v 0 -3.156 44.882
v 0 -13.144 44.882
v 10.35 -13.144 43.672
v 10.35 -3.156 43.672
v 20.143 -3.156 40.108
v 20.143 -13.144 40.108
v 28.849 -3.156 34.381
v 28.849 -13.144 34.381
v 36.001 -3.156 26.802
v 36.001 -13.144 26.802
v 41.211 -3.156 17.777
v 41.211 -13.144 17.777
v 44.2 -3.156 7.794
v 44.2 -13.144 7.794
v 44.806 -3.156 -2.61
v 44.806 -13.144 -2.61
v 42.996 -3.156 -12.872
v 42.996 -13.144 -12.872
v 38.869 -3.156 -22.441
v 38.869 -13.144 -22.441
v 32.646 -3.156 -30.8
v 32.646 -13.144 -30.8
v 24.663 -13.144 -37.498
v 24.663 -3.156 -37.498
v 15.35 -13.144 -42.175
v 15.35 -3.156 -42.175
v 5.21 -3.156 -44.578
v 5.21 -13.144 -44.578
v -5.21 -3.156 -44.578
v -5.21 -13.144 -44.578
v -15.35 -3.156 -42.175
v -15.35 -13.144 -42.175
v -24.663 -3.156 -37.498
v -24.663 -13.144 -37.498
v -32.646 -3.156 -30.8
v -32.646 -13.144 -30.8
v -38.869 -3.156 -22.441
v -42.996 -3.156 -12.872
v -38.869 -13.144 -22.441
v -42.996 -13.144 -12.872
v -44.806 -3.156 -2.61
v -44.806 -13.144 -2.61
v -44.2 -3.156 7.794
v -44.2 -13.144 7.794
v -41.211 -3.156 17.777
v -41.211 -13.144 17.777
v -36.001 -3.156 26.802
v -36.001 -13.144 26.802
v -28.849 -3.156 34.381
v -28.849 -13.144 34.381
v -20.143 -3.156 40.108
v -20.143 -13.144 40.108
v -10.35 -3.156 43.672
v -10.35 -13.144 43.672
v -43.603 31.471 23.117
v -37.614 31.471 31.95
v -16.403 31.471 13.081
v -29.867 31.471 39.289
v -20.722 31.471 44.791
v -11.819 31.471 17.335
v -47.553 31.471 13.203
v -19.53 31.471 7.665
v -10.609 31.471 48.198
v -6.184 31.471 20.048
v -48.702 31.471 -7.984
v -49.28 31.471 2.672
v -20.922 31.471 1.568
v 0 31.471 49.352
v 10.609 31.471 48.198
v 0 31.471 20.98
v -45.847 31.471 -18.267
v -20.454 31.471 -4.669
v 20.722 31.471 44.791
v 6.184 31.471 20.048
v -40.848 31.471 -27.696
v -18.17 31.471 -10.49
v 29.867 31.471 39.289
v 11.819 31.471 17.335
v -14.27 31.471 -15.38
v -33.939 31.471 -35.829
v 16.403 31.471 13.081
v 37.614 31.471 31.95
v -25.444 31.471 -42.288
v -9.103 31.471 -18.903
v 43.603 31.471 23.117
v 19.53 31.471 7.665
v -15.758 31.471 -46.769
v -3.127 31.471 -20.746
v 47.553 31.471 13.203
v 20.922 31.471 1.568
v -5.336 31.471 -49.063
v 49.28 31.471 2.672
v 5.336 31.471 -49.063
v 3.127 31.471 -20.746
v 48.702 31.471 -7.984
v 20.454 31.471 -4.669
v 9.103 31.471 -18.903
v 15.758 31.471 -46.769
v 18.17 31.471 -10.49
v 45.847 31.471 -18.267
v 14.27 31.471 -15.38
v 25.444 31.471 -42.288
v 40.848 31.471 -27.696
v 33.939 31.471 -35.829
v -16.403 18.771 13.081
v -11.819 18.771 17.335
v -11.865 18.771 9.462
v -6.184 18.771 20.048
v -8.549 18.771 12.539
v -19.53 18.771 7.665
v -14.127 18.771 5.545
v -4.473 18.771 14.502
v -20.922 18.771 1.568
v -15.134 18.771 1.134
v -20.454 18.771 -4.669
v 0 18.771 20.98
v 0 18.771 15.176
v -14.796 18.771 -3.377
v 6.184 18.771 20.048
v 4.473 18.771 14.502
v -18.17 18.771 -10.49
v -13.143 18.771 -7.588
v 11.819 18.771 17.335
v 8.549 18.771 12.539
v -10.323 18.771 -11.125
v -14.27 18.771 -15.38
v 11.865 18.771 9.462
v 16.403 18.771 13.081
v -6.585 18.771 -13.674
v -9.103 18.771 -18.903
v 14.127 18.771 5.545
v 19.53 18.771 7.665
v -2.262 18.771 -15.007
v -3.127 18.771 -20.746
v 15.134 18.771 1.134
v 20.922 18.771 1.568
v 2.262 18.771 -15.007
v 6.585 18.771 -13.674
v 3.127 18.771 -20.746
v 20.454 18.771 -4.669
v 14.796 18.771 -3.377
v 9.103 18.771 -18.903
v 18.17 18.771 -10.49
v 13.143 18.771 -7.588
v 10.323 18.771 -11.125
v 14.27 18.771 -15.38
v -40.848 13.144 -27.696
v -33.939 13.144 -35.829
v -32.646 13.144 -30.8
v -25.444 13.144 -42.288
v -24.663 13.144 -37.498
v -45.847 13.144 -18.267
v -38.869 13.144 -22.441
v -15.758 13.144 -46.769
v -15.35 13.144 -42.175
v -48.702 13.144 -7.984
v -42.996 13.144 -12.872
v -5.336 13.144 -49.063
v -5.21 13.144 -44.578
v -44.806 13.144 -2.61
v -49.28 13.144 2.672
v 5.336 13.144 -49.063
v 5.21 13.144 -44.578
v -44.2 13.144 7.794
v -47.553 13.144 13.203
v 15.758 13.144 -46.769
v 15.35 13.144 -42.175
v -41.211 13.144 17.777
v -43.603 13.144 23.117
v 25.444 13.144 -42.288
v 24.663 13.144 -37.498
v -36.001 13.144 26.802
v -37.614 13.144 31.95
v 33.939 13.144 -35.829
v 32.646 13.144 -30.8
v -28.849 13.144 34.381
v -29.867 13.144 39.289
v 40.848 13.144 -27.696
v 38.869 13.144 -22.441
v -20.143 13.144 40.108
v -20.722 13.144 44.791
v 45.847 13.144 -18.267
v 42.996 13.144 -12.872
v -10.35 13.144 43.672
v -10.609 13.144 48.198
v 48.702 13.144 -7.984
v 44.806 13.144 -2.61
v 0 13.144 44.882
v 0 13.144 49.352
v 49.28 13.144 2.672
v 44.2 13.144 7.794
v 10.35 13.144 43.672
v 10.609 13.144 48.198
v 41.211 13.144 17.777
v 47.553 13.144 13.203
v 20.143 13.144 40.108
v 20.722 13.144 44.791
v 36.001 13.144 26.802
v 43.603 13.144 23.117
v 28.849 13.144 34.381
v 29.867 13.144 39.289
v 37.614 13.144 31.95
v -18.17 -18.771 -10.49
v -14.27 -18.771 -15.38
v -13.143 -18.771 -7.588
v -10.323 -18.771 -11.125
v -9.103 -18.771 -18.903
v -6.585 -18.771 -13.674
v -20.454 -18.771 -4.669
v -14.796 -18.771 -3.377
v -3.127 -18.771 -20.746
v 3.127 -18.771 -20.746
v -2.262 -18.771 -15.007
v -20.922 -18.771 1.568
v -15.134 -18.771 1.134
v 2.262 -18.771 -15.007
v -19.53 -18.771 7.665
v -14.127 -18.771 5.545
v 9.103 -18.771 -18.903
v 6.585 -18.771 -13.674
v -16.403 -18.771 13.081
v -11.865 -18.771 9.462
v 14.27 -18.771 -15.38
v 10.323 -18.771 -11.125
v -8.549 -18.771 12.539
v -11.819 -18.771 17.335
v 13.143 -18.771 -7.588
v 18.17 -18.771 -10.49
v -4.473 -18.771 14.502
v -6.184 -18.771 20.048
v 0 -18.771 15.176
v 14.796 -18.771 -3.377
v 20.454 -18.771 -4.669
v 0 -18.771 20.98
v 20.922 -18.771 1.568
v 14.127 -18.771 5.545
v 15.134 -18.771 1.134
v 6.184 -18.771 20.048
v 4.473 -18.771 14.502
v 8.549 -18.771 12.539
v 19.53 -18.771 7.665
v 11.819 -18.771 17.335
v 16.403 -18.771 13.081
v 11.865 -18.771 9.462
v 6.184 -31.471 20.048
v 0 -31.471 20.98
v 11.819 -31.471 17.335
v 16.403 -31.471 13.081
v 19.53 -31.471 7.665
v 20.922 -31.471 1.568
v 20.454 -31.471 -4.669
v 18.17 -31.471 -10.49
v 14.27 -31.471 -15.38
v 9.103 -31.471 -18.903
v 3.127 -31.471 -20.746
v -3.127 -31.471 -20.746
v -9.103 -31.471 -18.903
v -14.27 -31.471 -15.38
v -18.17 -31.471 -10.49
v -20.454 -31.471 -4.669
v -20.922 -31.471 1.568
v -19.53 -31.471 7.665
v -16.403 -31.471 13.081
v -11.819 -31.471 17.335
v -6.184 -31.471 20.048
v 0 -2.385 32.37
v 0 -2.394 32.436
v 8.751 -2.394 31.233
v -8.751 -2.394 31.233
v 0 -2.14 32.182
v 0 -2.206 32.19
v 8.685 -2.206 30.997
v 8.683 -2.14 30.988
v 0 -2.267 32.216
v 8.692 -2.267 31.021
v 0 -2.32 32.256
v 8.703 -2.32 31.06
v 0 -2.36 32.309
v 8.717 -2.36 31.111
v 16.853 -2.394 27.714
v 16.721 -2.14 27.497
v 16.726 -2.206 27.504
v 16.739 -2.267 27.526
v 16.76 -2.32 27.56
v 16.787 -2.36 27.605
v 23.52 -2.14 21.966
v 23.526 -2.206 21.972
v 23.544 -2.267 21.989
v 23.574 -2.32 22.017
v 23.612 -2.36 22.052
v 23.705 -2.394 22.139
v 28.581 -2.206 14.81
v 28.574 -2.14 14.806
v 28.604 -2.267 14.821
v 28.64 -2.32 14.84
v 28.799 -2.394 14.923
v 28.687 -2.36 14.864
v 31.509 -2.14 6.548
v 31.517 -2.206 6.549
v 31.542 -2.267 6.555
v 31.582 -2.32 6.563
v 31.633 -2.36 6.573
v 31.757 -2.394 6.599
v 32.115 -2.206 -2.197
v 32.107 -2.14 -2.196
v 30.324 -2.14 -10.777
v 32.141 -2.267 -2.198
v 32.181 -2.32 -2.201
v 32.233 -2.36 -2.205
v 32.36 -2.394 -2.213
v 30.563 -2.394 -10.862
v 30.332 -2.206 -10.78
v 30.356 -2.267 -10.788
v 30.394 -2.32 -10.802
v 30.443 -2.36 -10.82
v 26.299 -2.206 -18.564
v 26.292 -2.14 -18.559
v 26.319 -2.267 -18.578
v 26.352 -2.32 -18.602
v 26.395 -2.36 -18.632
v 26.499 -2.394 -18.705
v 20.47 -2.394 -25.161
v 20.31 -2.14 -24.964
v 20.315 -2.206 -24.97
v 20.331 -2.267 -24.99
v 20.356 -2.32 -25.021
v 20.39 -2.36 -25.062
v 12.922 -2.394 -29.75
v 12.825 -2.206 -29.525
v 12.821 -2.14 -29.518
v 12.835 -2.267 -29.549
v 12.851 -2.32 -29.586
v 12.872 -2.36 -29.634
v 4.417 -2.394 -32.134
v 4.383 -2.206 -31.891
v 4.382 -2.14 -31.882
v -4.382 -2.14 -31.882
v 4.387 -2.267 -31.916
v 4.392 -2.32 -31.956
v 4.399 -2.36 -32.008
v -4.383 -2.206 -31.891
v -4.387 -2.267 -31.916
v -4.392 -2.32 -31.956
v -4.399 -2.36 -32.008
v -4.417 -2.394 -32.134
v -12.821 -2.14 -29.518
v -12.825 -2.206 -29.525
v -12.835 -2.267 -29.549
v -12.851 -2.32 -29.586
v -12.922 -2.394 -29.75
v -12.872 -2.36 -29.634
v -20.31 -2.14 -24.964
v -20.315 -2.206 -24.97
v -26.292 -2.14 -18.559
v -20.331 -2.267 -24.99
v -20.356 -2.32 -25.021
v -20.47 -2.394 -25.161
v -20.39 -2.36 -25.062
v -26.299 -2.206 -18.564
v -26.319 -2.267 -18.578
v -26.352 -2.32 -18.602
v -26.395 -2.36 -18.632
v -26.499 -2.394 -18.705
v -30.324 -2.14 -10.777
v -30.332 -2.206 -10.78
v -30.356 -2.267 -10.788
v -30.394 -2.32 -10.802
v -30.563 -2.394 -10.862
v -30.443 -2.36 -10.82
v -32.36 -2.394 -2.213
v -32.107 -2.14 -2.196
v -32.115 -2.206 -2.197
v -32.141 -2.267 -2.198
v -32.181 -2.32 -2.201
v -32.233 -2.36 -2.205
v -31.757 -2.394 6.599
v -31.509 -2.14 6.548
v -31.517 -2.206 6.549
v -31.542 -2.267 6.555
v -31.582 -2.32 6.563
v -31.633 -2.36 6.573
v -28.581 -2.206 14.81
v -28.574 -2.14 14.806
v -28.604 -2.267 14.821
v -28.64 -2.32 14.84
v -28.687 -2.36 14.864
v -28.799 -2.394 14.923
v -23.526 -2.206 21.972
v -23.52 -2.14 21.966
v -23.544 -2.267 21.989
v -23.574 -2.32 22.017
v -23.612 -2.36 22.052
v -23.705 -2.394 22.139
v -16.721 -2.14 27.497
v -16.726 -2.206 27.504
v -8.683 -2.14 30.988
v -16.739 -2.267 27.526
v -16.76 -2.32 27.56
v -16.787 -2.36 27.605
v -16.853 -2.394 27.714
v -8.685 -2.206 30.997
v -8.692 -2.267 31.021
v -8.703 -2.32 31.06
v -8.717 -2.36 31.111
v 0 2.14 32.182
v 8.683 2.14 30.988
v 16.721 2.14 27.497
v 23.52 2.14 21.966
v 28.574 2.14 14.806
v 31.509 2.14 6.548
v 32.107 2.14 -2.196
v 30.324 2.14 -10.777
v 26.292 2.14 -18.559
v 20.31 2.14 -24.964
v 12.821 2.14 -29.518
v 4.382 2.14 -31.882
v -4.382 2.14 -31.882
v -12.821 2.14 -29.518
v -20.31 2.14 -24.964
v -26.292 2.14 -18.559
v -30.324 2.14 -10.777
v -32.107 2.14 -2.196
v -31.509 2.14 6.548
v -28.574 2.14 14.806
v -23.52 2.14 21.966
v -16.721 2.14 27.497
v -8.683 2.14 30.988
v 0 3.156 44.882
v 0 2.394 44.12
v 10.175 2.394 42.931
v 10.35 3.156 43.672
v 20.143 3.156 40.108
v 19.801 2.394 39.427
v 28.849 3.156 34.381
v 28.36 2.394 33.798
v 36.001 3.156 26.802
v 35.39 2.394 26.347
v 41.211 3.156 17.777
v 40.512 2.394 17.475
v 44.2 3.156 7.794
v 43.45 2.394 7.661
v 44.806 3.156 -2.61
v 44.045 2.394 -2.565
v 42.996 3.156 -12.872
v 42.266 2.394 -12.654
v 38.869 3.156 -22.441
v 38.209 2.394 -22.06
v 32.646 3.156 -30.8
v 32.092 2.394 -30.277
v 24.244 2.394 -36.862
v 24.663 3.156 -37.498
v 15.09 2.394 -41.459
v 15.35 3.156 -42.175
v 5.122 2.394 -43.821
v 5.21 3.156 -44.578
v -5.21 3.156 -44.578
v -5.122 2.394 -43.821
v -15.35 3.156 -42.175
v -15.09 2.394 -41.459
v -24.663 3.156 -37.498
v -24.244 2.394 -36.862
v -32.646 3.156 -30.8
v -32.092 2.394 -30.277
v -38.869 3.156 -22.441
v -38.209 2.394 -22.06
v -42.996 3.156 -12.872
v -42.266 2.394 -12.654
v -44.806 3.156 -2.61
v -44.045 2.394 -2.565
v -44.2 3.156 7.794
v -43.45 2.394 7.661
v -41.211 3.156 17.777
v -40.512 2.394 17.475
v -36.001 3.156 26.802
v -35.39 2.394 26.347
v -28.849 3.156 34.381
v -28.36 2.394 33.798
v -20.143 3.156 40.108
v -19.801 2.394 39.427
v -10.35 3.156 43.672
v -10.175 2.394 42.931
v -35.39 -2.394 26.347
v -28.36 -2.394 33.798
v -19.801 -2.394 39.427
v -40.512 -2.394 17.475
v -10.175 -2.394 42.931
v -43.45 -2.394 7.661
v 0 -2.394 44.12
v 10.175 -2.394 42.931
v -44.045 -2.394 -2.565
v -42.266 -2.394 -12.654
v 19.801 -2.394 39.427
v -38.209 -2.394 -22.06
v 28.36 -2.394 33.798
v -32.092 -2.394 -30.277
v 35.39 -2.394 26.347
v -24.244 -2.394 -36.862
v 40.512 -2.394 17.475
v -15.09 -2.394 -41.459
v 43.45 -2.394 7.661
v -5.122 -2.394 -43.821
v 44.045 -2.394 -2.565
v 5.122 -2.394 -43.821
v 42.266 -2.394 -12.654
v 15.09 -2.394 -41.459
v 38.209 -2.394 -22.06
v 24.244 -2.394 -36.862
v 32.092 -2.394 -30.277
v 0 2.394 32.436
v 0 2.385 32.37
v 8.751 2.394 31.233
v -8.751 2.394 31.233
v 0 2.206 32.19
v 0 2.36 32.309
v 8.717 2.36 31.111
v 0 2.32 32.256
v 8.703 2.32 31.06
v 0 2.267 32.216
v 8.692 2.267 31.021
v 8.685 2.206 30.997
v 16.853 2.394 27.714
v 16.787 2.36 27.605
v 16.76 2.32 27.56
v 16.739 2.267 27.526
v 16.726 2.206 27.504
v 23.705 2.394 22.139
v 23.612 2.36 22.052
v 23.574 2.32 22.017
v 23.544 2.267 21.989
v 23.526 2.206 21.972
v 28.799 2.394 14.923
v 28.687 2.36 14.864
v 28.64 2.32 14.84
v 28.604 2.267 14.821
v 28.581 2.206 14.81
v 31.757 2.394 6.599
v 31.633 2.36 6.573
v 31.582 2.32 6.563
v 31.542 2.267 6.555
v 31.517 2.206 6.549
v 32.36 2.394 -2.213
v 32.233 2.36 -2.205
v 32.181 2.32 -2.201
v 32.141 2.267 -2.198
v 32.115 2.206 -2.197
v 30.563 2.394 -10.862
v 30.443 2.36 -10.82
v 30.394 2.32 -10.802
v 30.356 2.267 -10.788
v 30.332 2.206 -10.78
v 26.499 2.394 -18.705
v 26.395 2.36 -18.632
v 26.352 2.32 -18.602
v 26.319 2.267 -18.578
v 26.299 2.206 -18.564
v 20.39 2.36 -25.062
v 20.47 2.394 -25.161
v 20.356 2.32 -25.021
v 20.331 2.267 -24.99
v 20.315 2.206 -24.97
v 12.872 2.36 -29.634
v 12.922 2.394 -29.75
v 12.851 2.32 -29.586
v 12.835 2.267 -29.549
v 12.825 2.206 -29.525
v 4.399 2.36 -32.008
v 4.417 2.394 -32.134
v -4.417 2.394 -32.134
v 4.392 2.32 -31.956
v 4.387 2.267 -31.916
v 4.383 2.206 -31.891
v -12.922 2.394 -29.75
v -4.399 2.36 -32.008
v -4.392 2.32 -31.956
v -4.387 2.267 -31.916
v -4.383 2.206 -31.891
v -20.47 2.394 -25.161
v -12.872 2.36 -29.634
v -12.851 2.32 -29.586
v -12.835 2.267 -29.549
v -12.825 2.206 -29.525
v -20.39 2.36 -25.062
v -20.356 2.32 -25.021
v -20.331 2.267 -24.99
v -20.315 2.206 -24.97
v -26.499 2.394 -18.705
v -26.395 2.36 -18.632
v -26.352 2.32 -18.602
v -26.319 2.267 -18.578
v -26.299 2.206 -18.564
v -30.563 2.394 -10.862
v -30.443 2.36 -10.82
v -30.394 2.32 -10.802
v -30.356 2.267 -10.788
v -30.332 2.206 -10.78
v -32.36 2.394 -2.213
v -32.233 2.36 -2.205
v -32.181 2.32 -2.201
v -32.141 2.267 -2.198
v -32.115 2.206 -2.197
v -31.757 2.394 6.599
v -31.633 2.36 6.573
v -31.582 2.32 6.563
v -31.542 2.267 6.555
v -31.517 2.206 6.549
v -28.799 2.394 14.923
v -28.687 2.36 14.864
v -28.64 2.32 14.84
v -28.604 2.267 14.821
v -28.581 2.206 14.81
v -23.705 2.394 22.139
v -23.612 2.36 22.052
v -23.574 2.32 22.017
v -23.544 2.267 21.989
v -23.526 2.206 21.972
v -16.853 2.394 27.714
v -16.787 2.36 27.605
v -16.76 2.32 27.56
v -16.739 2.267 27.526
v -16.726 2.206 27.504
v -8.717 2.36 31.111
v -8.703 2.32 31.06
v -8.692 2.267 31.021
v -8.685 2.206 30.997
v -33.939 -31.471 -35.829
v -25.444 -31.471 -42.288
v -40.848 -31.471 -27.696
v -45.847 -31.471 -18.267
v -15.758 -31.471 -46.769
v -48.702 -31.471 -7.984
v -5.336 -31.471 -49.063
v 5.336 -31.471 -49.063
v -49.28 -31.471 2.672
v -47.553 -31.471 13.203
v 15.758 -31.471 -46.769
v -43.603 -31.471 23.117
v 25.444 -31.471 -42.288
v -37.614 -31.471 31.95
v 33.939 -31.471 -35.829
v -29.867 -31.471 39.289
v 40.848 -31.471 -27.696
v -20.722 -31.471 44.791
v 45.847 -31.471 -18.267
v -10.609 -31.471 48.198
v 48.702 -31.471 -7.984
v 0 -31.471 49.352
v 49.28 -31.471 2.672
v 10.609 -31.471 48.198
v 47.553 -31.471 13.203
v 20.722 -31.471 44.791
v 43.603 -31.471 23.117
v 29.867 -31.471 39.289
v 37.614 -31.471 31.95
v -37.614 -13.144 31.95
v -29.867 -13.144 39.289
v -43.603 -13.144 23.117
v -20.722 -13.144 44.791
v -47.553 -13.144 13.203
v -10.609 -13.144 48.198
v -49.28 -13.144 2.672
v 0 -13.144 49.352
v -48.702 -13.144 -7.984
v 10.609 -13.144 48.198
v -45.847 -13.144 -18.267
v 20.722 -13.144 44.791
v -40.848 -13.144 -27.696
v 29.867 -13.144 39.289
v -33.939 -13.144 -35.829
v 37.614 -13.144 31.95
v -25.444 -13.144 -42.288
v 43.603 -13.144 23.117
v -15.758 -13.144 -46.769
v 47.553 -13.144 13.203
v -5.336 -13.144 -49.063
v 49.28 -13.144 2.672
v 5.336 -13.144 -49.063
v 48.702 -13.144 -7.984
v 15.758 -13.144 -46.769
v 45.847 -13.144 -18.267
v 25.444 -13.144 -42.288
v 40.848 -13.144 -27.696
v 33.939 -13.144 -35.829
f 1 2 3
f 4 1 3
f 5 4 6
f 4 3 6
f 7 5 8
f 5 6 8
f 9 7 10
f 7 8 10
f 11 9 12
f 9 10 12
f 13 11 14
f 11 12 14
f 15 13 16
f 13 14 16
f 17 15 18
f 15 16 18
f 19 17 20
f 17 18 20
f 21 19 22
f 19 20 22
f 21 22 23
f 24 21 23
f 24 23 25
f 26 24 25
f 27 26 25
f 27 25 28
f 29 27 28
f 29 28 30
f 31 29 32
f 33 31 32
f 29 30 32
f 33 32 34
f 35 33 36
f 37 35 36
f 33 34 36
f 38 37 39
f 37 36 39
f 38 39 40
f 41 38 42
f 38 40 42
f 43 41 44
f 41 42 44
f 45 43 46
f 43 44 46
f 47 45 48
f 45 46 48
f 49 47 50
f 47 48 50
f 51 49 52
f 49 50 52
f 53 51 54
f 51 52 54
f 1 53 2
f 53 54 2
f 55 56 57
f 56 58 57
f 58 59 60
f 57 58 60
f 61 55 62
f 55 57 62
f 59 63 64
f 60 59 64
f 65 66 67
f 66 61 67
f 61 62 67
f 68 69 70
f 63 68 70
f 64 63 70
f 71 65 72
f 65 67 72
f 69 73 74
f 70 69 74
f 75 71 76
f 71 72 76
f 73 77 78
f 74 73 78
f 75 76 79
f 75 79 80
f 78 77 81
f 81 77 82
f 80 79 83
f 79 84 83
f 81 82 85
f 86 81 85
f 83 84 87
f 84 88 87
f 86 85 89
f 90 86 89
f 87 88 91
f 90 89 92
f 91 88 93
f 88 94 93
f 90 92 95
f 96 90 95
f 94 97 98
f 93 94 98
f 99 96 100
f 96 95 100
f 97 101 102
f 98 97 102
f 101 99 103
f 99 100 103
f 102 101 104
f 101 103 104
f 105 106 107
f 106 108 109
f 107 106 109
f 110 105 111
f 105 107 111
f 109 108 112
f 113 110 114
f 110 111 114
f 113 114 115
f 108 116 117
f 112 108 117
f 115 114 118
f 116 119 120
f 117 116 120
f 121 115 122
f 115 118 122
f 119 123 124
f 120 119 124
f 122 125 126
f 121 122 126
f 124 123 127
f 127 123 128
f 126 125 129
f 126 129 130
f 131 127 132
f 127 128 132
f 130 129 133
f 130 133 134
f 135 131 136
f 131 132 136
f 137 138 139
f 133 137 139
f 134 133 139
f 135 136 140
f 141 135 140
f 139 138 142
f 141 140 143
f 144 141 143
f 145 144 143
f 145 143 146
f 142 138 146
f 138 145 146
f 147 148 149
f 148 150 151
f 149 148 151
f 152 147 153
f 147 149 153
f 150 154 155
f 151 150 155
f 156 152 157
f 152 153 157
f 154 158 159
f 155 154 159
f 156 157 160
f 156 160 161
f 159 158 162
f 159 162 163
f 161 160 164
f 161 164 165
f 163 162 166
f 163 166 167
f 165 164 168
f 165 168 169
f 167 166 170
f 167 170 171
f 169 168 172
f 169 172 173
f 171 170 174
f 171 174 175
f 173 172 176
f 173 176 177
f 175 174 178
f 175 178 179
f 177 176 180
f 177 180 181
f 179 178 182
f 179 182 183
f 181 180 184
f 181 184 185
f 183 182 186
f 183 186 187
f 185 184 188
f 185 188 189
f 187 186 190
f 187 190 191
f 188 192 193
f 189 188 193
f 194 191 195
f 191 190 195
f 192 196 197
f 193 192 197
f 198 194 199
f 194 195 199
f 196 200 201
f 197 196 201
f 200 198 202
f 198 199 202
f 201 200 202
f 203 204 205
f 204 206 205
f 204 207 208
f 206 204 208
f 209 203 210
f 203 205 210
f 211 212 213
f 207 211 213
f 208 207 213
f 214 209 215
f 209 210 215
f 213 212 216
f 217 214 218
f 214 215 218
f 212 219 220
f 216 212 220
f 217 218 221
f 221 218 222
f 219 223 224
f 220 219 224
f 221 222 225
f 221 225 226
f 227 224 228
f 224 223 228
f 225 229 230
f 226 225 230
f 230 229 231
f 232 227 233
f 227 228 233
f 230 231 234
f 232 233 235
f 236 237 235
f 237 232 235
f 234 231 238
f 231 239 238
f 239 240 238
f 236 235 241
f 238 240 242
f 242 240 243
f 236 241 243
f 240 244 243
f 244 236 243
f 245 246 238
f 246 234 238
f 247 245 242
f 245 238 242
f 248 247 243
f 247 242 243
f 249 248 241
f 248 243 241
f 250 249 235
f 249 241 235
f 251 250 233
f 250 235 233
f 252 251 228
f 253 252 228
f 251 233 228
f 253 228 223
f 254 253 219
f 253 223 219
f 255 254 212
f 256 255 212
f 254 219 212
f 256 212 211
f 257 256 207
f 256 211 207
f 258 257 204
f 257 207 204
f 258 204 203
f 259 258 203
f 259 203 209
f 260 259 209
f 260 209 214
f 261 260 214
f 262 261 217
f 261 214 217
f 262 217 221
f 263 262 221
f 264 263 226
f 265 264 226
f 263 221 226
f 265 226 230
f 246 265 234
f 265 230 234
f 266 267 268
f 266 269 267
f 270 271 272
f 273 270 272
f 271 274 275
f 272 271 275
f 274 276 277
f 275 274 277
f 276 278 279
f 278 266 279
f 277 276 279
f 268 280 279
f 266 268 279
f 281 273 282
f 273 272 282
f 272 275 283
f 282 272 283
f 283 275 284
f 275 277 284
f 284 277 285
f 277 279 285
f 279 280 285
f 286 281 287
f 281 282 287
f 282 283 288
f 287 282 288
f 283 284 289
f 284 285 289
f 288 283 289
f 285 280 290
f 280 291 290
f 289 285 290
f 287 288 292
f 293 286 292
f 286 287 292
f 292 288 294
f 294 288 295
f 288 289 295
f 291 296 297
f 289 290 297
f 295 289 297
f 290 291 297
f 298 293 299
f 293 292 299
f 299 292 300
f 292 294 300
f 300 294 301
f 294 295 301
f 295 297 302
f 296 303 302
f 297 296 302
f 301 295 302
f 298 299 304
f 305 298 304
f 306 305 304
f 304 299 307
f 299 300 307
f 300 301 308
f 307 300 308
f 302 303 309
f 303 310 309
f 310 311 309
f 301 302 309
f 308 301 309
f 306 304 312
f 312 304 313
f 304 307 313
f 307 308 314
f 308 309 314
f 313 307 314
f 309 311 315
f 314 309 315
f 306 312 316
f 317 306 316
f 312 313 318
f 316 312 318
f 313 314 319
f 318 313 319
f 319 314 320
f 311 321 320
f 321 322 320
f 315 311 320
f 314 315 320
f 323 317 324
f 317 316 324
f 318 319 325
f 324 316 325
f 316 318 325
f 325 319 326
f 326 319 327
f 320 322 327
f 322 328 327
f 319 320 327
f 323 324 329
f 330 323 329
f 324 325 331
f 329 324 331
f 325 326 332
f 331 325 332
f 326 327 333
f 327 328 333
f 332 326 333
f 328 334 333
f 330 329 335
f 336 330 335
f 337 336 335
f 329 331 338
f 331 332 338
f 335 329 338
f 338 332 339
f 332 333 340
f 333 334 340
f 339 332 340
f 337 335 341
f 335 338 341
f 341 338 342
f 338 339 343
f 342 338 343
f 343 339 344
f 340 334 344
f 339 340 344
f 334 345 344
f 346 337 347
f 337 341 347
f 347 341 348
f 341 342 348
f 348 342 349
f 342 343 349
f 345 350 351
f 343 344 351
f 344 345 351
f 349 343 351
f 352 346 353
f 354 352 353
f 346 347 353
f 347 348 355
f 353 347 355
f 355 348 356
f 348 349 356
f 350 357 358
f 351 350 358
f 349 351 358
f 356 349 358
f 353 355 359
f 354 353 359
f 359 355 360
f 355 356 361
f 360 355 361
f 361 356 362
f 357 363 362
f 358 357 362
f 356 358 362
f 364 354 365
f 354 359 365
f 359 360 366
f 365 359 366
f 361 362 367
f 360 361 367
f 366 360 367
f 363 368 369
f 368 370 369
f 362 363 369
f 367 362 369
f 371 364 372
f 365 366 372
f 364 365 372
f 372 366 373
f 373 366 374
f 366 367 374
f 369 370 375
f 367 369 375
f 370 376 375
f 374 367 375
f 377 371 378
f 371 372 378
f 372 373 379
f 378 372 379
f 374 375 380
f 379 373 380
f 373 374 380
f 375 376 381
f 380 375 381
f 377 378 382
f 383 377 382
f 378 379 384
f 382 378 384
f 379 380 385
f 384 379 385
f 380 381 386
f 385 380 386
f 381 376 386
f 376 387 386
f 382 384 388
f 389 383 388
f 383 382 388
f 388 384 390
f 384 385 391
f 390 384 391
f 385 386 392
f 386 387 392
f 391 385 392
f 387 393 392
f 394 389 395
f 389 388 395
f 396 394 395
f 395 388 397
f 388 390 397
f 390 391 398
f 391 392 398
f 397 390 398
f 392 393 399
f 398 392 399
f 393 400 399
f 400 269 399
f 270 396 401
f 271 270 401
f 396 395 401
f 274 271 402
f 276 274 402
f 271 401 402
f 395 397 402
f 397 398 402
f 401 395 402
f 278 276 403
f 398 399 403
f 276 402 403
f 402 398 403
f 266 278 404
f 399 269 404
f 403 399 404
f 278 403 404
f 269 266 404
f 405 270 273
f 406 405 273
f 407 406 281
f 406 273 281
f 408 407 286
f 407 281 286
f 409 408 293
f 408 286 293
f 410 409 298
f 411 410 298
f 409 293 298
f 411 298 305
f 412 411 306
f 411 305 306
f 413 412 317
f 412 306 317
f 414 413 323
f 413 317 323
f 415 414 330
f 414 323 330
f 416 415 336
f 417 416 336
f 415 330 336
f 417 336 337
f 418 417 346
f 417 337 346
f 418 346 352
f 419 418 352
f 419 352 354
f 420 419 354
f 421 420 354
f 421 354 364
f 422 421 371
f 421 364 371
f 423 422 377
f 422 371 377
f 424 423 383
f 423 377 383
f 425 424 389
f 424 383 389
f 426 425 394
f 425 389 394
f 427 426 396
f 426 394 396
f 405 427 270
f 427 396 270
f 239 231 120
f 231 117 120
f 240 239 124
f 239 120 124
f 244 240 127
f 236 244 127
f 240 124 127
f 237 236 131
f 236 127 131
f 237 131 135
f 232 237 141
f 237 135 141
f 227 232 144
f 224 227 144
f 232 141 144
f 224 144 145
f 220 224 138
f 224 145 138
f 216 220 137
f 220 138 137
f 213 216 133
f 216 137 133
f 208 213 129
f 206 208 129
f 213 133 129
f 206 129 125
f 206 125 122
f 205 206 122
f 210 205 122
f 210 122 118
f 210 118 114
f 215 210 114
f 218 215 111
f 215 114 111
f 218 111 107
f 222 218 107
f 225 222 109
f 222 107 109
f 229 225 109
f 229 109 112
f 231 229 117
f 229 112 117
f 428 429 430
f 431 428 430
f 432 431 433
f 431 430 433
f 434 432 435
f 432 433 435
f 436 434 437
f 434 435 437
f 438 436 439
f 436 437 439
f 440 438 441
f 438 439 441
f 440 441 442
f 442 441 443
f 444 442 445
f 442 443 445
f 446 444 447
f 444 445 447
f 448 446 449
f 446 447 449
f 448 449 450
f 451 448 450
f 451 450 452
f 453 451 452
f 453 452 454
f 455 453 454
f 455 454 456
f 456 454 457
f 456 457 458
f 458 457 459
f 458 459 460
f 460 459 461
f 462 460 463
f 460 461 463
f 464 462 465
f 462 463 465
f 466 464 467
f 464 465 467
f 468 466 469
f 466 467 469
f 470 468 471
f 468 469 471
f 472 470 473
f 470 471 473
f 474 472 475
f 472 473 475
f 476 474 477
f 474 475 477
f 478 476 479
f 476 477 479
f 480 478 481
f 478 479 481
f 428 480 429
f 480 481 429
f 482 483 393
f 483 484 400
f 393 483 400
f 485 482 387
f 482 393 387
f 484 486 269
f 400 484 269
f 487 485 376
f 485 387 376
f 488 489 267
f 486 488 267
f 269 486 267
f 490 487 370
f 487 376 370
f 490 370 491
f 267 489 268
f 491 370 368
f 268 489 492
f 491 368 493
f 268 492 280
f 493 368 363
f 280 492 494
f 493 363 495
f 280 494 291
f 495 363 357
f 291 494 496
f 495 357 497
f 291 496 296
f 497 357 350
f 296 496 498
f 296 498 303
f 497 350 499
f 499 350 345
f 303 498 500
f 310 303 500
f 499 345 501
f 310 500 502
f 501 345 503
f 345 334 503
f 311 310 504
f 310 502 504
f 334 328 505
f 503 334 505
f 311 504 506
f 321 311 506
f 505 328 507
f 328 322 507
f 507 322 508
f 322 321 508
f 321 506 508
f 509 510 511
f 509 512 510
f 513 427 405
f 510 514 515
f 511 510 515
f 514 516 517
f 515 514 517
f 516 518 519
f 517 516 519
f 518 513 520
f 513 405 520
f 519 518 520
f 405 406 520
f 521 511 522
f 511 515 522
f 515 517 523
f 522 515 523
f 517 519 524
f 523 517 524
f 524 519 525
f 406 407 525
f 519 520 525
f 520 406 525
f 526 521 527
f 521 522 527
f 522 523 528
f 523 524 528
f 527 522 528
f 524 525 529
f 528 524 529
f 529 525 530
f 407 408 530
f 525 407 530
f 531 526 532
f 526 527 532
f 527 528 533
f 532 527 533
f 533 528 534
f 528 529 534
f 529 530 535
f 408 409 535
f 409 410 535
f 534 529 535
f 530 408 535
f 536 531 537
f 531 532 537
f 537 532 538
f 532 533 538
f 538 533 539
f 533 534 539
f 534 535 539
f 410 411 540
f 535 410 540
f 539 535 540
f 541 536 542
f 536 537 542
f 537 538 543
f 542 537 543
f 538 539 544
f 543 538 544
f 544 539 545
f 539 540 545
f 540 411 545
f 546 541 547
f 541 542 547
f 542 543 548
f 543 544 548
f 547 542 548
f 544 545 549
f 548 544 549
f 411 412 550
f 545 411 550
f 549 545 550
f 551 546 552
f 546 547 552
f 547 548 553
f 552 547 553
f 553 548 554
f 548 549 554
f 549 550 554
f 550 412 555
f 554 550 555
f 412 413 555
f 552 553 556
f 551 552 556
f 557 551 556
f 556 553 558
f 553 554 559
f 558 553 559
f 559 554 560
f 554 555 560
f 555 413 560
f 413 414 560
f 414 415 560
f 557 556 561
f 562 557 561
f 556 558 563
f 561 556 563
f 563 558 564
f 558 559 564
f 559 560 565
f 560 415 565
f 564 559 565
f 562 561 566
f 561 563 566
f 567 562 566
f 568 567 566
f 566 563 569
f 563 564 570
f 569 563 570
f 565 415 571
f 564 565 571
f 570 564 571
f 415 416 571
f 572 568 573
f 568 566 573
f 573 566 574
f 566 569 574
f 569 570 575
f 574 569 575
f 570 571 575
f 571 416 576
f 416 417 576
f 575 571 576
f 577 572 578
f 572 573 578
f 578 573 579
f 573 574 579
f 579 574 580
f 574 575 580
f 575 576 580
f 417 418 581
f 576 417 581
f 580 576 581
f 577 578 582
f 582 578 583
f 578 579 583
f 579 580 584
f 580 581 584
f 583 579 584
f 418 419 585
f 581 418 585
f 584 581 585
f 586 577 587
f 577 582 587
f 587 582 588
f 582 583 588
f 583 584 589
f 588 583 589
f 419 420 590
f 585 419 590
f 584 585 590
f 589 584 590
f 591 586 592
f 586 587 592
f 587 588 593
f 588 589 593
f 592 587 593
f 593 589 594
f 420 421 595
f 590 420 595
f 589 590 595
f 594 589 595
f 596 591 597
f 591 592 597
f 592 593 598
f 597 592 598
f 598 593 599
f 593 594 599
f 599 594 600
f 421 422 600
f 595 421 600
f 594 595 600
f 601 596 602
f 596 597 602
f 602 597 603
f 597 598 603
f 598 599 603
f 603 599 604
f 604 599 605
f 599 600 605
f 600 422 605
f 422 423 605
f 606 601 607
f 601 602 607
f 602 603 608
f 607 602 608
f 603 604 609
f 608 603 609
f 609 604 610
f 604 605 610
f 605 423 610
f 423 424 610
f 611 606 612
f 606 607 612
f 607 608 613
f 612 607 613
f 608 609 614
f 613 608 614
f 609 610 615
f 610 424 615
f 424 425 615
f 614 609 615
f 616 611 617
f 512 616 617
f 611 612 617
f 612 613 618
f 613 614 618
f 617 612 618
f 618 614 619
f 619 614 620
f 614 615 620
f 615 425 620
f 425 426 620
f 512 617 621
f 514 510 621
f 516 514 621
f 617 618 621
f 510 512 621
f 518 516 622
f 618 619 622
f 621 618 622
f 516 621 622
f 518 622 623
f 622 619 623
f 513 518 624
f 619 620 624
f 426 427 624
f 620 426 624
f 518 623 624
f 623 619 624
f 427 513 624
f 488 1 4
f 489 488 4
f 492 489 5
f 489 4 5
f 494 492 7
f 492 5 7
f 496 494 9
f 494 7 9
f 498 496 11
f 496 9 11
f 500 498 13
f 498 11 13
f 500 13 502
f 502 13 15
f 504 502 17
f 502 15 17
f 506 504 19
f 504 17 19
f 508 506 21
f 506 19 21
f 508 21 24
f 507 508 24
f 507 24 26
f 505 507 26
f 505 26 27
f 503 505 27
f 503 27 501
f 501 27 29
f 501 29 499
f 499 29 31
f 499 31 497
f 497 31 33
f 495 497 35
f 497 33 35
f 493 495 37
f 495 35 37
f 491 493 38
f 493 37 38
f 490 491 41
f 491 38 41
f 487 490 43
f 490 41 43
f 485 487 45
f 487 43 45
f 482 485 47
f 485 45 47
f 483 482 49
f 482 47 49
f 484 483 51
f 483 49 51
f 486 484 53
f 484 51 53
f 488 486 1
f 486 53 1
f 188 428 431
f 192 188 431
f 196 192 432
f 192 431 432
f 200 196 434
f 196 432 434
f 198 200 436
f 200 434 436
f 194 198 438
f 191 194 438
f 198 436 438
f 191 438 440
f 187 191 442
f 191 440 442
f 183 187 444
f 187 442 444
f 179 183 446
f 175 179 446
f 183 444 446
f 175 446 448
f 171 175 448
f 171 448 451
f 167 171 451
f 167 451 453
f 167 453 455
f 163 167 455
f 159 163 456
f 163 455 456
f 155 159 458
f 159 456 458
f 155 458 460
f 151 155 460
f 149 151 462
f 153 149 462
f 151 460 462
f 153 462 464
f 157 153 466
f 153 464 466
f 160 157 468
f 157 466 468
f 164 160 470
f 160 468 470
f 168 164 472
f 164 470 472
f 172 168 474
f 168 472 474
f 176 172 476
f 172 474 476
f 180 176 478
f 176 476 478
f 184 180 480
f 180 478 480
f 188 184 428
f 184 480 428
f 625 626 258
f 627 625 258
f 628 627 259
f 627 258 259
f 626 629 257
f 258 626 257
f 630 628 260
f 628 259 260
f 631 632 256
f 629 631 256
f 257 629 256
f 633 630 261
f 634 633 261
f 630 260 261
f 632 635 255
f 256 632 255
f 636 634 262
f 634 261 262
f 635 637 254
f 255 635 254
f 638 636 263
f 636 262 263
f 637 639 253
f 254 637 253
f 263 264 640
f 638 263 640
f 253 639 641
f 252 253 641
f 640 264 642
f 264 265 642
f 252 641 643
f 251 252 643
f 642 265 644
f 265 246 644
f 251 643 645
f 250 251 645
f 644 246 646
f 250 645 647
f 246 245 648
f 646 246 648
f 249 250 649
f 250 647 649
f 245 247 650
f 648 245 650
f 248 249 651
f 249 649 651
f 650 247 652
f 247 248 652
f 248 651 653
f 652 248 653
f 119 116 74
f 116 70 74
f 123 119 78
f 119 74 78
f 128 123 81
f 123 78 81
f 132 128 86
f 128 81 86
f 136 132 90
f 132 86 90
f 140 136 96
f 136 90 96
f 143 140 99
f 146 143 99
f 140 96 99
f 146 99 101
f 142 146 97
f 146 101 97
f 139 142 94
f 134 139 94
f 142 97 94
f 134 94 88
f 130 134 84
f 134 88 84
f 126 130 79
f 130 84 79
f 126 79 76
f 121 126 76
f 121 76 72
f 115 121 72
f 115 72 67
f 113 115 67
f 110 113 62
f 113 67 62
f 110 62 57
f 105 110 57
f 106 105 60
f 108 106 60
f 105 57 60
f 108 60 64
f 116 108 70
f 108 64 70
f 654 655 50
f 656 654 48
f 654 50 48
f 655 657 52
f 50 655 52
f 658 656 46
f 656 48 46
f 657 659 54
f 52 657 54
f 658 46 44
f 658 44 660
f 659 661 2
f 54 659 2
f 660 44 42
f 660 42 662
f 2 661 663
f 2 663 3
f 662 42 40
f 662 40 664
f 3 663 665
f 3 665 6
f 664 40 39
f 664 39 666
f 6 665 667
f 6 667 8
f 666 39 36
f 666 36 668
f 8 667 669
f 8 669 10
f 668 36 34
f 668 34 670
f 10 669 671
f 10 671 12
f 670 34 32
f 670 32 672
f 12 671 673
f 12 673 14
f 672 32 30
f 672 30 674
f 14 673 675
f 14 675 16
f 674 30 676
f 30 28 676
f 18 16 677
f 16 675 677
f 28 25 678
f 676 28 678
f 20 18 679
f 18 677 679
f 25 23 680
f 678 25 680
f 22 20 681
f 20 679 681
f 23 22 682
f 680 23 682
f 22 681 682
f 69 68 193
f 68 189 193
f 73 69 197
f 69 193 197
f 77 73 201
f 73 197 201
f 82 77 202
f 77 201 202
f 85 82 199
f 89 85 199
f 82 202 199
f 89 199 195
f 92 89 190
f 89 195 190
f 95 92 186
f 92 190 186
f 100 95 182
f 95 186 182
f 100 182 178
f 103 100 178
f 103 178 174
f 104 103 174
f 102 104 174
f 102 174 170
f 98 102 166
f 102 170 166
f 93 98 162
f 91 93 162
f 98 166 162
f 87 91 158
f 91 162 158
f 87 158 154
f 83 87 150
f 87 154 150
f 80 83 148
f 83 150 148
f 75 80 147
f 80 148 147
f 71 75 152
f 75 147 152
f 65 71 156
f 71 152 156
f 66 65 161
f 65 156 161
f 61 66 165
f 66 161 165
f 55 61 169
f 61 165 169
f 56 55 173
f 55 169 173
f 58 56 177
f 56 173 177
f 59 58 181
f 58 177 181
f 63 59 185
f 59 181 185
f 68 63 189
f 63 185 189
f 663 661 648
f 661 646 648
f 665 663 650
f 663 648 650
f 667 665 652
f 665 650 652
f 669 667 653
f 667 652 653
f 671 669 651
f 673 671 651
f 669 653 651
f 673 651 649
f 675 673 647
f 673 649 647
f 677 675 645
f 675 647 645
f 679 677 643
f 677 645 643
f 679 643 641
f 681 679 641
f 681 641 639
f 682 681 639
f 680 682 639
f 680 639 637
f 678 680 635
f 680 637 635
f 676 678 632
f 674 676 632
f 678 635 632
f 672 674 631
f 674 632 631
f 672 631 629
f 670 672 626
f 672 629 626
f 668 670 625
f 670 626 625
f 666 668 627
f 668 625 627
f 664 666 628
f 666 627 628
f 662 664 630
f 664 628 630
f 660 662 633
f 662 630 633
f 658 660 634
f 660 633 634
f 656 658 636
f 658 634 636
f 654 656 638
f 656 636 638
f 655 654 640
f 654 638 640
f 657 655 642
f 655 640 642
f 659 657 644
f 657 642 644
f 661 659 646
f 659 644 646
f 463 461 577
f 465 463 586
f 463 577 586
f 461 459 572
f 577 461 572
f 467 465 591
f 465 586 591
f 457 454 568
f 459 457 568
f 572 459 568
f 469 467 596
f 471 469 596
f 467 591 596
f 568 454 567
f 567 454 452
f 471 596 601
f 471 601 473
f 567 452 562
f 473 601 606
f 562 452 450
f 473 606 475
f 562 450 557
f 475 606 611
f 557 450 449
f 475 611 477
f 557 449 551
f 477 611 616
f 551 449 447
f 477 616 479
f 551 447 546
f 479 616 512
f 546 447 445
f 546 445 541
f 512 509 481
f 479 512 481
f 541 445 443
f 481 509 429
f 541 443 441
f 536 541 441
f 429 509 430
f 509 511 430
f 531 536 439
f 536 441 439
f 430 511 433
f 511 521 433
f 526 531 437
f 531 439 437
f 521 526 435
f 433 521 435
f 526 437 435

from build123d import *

# Parameters (mm, degrees)
F2_SIZE = 0.762
F3_R    = 0.254


with BuildPart() as f1:
    # F0 (on Right) → F1 (revolve)
    with BuildSketch(Plane.YZ):
        Polygon((-18.7706, 15.1765), (0, 15.1765), (18.7706, 15.1765), (18.7706, 20.9804), (31.4706, 20.9804), (31.4706, 49.3522), (13.1445, 49.3522), (13.1445, 44.8818), (2.39395, 44.8818), (2.39395, 32.1818), (-2.39395, 32.1818), (-2.39395, 44.8818), (-13.1445, 44.8818), (-13.1445, 49.3522), (-31.4706, 49.3522), (-31.4706, 20.9804), (-18.7706, 20.9804), align=None)
    revolve(axis=Axis((0, -0.984378, 0), (0, 1, 0)))

    # F2
    f2_edges = [f1.edges().sort_by_distance(p)[0] for p in [
        (0, 2.39395, -44.8818),
        (0, -2.39395, -44.8818),
    ]]
    chamfer(f2_edges, length=F2_SIZE)

    # F3
    f3_edges = [f1.edges().sort_by_distance(p)[0] for p in [
        (0, 2.39395, -32.1818),
        (0, -2.39395, -32.1818),
    ]]
    fillet(f3_edges, radius=F3_R)


solid = f1.part
